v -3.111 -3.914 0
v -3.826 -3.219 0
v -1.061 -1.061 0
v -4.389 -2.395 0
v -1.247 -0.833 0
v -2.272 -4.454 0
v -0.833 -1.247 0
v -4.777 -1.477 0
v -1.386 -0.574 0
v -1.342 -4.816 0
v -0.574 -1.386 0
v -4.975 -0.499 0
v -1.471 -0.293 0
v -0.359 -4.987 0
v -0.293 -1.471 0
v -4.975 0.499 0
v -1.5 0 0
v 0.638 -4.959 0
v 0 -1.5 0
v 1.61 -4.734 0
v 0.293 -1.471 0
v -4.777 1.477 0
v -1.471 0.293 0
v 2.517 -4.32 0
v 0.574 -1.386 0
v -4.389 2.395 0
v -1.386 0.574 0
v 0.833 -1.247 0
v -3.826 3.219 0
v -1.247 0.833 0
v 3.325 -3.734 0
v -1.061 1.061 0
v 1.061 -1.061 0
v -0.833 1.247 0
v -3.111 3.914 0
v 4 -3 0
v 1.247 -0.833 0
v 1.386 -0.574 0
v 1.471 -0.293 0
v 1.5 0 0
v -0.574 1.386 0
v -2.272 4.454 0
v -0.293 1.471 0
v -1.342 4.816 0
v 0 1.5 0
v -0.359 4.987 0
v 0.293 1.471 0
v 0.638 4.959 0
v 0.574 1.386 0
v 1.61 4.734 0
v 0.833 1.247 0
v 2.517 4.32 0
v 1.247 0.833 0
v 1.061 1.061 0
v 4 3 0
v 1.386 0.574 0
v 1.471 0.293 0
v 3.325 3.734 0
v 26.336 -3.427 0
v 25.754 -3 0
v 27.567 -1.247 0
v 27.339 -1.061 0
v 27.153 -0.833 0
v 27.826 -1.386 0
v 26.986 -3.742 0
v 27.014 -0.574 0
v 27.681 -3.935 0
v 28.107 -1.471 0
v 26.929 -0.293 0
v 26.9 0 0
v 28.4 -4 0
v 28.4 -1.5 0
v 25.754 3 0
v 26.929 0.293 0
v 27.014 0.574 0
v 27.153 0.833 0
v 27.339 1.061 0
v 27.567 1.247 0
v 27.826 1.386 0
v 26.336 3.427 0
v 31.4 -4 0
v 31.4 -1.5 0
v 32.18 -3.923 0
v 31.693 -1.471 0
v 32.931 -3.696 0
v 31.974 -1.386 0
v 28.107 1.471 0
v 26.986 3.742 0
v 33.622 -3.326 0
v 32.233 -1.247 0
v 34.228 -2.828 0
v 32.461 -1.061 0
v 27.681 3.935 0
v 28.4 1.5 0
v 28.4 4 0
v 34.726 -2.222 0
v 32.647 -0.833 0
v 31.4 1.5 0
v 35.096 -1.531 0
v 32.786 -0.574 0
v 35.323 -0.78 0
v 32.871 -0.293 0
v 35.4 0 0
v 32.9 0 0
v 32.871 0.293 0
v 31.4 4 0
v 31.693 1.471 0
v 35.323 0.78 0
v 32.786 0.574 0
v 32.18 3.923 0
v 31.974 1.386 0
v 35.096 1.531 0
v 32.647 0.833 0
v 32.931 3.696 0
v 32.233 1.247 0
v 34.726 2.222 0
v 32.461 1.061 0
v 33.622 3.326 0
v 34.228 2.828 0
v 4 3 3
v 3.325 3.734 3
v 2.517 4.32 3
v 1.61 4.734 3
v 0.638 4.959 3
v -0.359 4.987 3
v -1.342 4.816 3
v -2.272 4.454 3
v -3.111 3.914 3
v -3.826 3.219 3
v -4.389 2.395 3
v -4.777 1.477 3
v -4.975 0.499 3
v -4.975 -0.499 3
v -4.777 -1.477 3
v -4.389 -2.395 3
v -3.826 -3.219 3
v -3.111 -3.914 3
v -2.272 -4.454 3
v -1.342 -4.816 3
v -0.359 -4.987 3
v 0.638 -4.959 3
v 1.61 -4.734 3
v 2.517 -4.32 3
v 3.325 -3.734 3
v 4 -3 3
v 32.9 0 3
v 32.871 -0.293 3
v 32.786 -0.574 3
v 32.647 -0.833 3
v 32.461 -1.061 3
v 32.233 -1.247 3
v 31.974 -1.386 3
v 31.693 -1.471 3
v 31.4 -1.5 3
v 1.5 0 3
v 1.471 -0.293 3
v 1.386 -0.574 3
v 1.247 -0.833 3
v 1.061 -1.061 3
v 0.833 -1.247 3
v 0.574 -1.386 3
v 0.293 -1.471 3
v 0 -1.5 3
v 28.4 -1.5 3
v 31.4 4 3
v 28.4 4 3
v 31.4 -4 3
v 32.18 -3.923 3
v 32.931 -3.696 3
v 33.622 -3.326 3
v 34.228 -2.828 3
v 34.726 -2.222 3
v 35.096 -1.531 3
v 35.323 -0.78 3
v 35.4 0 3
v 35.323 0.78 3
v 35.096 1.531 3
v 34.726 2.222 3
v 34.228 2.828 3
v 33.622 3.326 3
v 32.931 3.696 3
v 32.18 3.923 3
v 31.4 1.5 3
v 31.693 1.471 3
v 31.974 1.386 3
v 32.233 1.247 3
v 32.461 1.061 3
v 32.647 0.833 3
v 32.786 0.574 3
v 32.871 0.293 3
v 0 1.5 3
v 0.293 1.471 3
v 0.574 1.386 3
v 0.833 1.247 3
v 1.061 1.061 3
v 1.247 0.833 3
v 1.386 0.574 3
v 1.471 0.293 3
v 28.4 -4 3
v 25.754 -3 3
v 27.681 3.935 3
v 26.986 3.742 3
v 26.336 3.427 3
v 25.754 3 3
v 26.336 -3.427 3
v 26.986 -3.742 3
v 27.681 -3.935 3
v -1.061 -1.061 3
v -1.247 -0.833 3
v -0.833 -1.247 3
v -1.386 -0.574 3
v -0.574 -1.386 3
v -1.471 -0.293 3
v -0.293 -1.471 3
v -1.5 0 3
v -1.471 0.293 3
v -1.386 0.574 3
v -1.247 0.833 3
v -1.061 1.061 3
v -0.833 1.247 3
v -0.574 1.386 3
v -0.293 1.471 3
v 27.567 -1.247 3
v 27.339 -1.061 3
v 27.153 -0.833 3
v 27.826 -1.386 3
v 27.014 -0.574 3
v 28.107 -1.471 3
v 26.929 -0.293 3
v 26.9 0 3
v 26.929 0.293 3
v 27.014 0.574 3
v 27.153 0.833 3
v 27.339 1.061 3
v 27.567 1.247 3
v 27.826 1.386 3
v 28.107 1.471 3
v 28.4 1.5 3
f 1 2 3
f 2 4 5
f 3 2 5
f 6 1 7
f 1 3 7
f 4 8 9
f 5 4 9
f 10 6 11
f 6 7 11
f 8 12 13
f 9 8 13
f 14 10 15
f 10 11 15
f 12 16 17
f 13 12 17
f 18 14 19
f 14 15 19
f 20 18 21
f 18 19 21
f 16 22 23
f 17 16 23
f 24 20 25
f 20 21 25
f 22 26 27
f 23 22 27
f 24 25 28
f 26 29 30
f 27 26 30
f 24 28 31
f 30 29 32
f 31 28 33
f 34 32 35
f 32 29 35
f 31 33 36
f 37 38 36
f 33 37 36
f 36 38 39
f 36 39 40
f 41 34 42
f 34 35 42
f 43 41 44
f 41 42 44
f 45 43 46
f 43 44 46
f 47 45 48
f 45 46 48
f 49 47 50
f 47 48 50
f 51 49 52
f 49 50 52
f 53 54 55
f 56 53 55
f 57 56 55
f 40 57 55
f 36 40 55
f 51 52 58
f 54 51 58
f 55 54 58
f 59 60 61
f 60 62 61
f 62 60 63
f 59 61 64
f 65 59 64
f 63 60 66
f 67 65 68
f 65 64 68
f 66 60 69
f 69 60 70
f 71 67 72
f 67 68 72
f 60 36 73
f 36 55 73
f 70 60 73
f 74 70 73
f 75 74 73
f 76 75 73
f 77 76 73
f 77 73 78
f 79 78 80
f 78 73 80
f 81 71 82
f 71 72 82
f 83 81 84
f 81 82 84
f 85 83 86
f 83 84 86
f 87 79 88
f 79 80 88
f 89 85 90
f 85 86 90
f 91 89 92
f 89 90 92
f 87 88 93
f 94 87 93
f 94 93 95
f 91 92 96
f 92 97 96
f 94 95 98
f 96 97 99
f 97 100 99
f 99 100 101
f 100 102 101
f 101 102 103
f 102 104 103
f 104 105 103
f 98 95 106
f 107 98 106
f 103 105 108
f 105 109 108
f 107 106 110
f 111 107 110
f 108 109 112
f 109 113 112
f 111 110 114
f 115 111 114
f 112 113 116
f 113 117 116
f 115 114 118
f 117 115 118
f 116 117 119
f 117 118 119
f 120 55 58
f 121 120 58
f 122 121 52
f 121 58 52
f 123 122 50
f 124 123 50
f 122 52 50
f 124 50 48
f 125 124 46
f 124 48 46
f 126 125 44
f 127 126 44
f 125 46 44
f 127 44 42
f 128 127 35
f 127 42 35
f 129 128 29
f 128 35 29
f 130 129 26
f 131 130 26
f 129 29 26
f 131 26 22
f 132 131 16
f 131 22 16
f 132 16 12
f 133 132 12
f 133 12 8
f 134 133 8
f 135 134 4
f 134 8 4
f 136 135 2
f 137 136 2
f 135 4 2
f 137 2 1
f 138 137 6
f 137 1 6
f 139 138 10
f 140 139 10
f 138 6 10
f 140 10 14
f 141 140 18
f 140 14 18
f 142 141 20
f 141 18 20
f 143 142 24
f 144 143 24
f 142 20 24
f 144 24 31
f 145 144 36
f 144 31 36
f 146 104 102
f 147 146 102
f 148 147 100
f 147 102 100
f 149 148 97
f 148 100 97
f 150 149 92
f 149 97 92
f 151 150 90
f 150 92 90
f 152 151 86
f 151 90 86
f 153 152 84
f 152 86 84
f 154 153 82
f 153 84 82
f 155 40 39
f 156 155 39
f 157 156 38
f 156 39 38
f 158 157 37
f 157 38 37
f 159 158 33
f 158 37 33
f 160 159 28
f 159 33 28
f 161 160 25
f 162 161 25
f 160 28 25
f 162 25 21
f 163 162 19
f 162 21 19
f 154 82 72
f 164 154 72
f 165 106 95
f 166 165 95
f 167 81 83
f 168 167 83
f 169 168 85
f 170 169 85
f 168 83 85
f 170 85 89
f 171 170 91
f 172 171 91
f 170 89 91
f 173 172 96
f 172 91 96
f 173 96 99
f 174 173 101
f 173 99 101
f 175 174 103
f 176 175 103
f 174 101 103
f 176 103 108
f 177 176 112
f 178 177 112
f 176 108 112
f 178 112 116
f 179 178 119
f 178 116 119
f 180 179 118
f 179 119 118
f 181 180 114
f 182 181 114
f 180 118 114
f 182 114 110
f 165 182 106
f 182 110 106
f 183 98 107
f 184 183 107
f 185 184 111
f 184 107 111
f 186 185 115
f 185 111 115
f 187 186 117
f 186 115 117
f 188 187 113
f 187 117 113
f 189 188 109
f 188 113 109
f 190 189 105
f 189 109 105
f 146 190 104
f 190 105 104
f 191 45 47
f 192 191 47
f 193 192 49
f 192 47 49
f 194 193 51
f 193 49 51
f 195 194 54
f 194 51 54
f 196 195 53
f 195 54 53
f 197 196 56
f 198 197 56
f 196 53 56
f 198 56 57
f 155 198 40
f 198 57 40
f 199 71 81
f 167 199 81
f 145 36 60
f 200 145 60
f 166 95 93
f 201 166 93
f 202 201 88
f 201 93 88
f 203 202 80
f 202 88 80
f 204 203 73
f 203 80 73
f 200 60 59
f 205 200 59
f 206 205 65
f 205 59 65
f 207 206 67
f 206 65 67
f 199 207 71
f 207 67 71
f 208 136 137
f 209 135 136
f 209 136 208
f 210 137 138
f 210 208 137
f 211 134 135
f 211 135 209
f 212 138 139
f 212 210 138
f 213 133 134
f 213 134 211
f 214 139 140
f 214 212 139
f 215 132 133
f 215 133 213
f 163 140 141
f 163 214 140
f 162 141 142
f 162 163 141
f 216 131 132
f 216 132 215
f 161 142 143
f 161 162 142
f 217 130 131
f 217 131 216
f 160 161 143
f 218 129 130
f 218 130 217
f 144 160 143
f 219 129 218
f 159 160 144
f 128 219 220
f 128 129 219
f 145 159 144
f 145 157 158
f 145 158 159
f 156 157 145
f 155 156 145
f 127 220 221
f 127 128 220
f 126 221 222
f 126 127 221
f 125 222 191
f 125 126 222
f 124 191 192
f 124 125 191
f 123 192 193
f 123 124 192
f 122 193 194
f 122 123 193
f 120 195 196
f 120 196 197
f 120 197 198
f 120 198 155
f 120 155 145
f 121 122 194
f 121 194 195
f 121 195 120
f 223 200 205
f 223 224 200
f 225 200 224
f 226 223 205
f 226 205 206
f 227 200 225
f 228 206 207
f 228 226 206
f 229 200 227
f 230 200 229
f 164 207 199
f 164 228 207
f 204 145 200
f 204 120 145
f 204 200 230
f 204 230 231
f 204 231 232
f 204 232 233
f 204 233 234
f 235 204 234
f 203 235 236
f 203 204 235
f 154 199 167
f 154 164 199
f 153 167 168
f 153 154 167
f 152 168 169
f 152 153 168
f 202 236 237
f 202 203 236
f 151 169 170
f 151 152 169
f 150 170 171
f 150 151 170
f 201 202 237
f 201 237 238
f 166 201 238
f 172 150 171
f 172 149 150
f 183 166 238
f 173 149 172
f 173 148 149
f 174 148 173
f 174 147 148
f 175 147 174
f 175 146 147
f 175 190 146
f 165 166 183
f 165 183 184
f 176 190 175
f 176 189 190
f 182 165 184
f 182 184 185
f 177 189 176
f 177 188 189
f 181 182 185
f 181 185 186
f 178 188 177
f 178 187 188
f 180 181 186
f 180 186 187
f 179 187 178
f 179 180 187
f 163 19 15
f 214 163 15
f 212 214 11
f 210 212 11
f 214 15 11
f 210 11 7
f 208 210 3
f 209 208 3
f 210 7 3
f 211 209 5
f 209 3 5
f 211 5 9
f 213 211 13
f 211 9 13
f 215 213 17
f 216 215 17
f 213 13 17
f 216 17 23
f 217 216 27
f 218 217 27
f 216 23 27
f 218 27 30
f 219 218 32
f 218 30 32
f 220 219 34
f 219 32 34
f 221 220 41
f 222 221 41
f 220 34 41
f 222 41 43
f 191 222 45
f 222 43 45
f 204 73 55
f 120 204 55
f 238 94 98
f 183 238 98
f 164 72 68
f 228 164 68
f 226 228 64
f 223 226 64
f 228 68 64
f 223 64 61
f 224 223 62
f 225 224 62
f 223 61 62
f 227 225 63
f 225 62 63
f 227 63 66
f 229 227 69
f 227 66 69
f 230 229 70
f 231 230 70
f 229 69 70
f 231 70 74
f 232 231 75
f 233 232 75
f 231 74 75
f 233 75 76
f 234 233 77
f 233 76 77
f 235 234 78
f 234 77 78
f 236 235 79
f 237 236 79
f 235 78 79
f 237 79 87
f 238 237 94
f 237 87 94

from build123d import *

# Parameters (mm, degrees)
SALIENTE_EXTRUIR2_DEPTH = 3


with BuildPart() as part:
    # Croquis1 → Saliente-Extruir2 (new body)
    # profile 1 of 6: a face of its own
    with BuildSketch(Plane.XY):
        with BuildLine():
            Line((0, -1.5), (0, -3))
            Line((0, -3), (4, -3))
            ThreePointArc((4, -3), (4.74341649, -1.58113883), (5, 0))
            ThreePointArc((5, 0), (4.74341649, 1.58113883), (4, 3))
            Line((4, 3), (0, 3))
            Line((0, 3), (0, 1.5))
            ThreePointArc((0, 1.5), (1.060660172, 1.060660172), (1.5, 0))
            ThreePointArc((1.5, 0), (1.060660172, -1.060660172), (0, -1.5))
        make_face()
    # profile 2 of 6: a face of its own
    with BuildSketch(Plane.XY):
        with BuildLine():
            Line((4, -3), (0, -3))
            Line((0, -3), (0, -1.5))
            ThreePointArc((0, -1.5), (-1.5, 0), (0, 1.5))
            Line((0, 1.5), (0, 3))
            Line((0, 3), (4, 3))
            ThreePointArc((4, 3), (-5, 0), (4, -3))
        make_face()
    # profile 3 of 6: a face of its own
    with BuildSketch(Plane.XY):
        with BuildLine():
            Line((0, -1.5), (0, -3))
            Line((0, -3), (4, -3))
            ThreePointArc((4, -3), (4.74341649, -1.58113883), (5, 0))
            ThreePointArc((5, 0), (4.74341649, 1.58113883), (4, 3))
            Line((4, 3), (0, 3))
            Line((0, 3), (0, 1.5))
            ThreePointArc((0, 1.5), (1.060660172, 1.060660172), (1.5, 0))
            ThreePointArc((1.5, 0), (1.060660172, -1.060660172), (0, -1.5))
        make_face()
    # profile 4 of 6: a face of its own
    with BuildSketch(Plane.XY):
        with BuildLine():
            Line((4, -3), (0, -3))
            Line((0, -3), (0, -1.5))
            ThreePointArc((0, -1.5), (-1.5, 0), (0, 1.5))
            Line((0, 1.5), (0, 3))
            Line((0, 3), (4, 3))
            ThreePointArc((4, 3), (-5, 0), (4, -3))
        make_face()
    # profile 5 of 6: a face of its own
    with BuildSketch(Plane.XY):
        with BuildLine():
            ThreePointArc((5, 0), (4.74341649, -1.58113883), (4, -3))
            Line((4, -3), (25.754248689, -3))
            ThreePointArc((25.754248689, -3), (24.4, 0), (25.754248689, 3))
            Line((25.754248689, 3), (4, 3))
            ThreePointArc((4, 3), (4.74341649, 1.58113883), (5, 0))
        make_face()
    # profile 6 of 6: a face of its own
    with BuildSketch(Plane.XY):
        with BuildLine():
            ThreePointArc((25.754248689, 3), (24.4, 0), (25.754248689, -3))
            ThreePointArc((25.754248689, -3), (26.985786438, -3.741657387), (28.4, -4))
            Line((28.4, -4), (31.4, -4))
            ThreePointArc((31.4, -4), (35.4, 0), (31.4, 4))
            Line((31.4, 4), (28.4, 4))
            ThreePointArc((28.4, 4), (26.985786438, 3.741657387), (25.754248689, 3))
        make_face()
        with BuildLine():
            Line((31.4, -1.5), (28.4, -1.5))
            ThreePointArc((28.4, -1.5), (26.9, 0), (28.4, 1.5))
            Line((28.4, 1.5), (31.4, 1.5))
            ThreePointArc((31.4, 1.5), (32.460660172, 1.060660172), (32.9, 0))
            ThreePointArc((32.9, 0), (32.460660172, -1.060660172), (31.4, -1.5))
        make_face(mode=Mode.SUBTRACT)
    extrude(amount=SALIENTE_EXTRUIR2_DEPTH)


solid = part.part
